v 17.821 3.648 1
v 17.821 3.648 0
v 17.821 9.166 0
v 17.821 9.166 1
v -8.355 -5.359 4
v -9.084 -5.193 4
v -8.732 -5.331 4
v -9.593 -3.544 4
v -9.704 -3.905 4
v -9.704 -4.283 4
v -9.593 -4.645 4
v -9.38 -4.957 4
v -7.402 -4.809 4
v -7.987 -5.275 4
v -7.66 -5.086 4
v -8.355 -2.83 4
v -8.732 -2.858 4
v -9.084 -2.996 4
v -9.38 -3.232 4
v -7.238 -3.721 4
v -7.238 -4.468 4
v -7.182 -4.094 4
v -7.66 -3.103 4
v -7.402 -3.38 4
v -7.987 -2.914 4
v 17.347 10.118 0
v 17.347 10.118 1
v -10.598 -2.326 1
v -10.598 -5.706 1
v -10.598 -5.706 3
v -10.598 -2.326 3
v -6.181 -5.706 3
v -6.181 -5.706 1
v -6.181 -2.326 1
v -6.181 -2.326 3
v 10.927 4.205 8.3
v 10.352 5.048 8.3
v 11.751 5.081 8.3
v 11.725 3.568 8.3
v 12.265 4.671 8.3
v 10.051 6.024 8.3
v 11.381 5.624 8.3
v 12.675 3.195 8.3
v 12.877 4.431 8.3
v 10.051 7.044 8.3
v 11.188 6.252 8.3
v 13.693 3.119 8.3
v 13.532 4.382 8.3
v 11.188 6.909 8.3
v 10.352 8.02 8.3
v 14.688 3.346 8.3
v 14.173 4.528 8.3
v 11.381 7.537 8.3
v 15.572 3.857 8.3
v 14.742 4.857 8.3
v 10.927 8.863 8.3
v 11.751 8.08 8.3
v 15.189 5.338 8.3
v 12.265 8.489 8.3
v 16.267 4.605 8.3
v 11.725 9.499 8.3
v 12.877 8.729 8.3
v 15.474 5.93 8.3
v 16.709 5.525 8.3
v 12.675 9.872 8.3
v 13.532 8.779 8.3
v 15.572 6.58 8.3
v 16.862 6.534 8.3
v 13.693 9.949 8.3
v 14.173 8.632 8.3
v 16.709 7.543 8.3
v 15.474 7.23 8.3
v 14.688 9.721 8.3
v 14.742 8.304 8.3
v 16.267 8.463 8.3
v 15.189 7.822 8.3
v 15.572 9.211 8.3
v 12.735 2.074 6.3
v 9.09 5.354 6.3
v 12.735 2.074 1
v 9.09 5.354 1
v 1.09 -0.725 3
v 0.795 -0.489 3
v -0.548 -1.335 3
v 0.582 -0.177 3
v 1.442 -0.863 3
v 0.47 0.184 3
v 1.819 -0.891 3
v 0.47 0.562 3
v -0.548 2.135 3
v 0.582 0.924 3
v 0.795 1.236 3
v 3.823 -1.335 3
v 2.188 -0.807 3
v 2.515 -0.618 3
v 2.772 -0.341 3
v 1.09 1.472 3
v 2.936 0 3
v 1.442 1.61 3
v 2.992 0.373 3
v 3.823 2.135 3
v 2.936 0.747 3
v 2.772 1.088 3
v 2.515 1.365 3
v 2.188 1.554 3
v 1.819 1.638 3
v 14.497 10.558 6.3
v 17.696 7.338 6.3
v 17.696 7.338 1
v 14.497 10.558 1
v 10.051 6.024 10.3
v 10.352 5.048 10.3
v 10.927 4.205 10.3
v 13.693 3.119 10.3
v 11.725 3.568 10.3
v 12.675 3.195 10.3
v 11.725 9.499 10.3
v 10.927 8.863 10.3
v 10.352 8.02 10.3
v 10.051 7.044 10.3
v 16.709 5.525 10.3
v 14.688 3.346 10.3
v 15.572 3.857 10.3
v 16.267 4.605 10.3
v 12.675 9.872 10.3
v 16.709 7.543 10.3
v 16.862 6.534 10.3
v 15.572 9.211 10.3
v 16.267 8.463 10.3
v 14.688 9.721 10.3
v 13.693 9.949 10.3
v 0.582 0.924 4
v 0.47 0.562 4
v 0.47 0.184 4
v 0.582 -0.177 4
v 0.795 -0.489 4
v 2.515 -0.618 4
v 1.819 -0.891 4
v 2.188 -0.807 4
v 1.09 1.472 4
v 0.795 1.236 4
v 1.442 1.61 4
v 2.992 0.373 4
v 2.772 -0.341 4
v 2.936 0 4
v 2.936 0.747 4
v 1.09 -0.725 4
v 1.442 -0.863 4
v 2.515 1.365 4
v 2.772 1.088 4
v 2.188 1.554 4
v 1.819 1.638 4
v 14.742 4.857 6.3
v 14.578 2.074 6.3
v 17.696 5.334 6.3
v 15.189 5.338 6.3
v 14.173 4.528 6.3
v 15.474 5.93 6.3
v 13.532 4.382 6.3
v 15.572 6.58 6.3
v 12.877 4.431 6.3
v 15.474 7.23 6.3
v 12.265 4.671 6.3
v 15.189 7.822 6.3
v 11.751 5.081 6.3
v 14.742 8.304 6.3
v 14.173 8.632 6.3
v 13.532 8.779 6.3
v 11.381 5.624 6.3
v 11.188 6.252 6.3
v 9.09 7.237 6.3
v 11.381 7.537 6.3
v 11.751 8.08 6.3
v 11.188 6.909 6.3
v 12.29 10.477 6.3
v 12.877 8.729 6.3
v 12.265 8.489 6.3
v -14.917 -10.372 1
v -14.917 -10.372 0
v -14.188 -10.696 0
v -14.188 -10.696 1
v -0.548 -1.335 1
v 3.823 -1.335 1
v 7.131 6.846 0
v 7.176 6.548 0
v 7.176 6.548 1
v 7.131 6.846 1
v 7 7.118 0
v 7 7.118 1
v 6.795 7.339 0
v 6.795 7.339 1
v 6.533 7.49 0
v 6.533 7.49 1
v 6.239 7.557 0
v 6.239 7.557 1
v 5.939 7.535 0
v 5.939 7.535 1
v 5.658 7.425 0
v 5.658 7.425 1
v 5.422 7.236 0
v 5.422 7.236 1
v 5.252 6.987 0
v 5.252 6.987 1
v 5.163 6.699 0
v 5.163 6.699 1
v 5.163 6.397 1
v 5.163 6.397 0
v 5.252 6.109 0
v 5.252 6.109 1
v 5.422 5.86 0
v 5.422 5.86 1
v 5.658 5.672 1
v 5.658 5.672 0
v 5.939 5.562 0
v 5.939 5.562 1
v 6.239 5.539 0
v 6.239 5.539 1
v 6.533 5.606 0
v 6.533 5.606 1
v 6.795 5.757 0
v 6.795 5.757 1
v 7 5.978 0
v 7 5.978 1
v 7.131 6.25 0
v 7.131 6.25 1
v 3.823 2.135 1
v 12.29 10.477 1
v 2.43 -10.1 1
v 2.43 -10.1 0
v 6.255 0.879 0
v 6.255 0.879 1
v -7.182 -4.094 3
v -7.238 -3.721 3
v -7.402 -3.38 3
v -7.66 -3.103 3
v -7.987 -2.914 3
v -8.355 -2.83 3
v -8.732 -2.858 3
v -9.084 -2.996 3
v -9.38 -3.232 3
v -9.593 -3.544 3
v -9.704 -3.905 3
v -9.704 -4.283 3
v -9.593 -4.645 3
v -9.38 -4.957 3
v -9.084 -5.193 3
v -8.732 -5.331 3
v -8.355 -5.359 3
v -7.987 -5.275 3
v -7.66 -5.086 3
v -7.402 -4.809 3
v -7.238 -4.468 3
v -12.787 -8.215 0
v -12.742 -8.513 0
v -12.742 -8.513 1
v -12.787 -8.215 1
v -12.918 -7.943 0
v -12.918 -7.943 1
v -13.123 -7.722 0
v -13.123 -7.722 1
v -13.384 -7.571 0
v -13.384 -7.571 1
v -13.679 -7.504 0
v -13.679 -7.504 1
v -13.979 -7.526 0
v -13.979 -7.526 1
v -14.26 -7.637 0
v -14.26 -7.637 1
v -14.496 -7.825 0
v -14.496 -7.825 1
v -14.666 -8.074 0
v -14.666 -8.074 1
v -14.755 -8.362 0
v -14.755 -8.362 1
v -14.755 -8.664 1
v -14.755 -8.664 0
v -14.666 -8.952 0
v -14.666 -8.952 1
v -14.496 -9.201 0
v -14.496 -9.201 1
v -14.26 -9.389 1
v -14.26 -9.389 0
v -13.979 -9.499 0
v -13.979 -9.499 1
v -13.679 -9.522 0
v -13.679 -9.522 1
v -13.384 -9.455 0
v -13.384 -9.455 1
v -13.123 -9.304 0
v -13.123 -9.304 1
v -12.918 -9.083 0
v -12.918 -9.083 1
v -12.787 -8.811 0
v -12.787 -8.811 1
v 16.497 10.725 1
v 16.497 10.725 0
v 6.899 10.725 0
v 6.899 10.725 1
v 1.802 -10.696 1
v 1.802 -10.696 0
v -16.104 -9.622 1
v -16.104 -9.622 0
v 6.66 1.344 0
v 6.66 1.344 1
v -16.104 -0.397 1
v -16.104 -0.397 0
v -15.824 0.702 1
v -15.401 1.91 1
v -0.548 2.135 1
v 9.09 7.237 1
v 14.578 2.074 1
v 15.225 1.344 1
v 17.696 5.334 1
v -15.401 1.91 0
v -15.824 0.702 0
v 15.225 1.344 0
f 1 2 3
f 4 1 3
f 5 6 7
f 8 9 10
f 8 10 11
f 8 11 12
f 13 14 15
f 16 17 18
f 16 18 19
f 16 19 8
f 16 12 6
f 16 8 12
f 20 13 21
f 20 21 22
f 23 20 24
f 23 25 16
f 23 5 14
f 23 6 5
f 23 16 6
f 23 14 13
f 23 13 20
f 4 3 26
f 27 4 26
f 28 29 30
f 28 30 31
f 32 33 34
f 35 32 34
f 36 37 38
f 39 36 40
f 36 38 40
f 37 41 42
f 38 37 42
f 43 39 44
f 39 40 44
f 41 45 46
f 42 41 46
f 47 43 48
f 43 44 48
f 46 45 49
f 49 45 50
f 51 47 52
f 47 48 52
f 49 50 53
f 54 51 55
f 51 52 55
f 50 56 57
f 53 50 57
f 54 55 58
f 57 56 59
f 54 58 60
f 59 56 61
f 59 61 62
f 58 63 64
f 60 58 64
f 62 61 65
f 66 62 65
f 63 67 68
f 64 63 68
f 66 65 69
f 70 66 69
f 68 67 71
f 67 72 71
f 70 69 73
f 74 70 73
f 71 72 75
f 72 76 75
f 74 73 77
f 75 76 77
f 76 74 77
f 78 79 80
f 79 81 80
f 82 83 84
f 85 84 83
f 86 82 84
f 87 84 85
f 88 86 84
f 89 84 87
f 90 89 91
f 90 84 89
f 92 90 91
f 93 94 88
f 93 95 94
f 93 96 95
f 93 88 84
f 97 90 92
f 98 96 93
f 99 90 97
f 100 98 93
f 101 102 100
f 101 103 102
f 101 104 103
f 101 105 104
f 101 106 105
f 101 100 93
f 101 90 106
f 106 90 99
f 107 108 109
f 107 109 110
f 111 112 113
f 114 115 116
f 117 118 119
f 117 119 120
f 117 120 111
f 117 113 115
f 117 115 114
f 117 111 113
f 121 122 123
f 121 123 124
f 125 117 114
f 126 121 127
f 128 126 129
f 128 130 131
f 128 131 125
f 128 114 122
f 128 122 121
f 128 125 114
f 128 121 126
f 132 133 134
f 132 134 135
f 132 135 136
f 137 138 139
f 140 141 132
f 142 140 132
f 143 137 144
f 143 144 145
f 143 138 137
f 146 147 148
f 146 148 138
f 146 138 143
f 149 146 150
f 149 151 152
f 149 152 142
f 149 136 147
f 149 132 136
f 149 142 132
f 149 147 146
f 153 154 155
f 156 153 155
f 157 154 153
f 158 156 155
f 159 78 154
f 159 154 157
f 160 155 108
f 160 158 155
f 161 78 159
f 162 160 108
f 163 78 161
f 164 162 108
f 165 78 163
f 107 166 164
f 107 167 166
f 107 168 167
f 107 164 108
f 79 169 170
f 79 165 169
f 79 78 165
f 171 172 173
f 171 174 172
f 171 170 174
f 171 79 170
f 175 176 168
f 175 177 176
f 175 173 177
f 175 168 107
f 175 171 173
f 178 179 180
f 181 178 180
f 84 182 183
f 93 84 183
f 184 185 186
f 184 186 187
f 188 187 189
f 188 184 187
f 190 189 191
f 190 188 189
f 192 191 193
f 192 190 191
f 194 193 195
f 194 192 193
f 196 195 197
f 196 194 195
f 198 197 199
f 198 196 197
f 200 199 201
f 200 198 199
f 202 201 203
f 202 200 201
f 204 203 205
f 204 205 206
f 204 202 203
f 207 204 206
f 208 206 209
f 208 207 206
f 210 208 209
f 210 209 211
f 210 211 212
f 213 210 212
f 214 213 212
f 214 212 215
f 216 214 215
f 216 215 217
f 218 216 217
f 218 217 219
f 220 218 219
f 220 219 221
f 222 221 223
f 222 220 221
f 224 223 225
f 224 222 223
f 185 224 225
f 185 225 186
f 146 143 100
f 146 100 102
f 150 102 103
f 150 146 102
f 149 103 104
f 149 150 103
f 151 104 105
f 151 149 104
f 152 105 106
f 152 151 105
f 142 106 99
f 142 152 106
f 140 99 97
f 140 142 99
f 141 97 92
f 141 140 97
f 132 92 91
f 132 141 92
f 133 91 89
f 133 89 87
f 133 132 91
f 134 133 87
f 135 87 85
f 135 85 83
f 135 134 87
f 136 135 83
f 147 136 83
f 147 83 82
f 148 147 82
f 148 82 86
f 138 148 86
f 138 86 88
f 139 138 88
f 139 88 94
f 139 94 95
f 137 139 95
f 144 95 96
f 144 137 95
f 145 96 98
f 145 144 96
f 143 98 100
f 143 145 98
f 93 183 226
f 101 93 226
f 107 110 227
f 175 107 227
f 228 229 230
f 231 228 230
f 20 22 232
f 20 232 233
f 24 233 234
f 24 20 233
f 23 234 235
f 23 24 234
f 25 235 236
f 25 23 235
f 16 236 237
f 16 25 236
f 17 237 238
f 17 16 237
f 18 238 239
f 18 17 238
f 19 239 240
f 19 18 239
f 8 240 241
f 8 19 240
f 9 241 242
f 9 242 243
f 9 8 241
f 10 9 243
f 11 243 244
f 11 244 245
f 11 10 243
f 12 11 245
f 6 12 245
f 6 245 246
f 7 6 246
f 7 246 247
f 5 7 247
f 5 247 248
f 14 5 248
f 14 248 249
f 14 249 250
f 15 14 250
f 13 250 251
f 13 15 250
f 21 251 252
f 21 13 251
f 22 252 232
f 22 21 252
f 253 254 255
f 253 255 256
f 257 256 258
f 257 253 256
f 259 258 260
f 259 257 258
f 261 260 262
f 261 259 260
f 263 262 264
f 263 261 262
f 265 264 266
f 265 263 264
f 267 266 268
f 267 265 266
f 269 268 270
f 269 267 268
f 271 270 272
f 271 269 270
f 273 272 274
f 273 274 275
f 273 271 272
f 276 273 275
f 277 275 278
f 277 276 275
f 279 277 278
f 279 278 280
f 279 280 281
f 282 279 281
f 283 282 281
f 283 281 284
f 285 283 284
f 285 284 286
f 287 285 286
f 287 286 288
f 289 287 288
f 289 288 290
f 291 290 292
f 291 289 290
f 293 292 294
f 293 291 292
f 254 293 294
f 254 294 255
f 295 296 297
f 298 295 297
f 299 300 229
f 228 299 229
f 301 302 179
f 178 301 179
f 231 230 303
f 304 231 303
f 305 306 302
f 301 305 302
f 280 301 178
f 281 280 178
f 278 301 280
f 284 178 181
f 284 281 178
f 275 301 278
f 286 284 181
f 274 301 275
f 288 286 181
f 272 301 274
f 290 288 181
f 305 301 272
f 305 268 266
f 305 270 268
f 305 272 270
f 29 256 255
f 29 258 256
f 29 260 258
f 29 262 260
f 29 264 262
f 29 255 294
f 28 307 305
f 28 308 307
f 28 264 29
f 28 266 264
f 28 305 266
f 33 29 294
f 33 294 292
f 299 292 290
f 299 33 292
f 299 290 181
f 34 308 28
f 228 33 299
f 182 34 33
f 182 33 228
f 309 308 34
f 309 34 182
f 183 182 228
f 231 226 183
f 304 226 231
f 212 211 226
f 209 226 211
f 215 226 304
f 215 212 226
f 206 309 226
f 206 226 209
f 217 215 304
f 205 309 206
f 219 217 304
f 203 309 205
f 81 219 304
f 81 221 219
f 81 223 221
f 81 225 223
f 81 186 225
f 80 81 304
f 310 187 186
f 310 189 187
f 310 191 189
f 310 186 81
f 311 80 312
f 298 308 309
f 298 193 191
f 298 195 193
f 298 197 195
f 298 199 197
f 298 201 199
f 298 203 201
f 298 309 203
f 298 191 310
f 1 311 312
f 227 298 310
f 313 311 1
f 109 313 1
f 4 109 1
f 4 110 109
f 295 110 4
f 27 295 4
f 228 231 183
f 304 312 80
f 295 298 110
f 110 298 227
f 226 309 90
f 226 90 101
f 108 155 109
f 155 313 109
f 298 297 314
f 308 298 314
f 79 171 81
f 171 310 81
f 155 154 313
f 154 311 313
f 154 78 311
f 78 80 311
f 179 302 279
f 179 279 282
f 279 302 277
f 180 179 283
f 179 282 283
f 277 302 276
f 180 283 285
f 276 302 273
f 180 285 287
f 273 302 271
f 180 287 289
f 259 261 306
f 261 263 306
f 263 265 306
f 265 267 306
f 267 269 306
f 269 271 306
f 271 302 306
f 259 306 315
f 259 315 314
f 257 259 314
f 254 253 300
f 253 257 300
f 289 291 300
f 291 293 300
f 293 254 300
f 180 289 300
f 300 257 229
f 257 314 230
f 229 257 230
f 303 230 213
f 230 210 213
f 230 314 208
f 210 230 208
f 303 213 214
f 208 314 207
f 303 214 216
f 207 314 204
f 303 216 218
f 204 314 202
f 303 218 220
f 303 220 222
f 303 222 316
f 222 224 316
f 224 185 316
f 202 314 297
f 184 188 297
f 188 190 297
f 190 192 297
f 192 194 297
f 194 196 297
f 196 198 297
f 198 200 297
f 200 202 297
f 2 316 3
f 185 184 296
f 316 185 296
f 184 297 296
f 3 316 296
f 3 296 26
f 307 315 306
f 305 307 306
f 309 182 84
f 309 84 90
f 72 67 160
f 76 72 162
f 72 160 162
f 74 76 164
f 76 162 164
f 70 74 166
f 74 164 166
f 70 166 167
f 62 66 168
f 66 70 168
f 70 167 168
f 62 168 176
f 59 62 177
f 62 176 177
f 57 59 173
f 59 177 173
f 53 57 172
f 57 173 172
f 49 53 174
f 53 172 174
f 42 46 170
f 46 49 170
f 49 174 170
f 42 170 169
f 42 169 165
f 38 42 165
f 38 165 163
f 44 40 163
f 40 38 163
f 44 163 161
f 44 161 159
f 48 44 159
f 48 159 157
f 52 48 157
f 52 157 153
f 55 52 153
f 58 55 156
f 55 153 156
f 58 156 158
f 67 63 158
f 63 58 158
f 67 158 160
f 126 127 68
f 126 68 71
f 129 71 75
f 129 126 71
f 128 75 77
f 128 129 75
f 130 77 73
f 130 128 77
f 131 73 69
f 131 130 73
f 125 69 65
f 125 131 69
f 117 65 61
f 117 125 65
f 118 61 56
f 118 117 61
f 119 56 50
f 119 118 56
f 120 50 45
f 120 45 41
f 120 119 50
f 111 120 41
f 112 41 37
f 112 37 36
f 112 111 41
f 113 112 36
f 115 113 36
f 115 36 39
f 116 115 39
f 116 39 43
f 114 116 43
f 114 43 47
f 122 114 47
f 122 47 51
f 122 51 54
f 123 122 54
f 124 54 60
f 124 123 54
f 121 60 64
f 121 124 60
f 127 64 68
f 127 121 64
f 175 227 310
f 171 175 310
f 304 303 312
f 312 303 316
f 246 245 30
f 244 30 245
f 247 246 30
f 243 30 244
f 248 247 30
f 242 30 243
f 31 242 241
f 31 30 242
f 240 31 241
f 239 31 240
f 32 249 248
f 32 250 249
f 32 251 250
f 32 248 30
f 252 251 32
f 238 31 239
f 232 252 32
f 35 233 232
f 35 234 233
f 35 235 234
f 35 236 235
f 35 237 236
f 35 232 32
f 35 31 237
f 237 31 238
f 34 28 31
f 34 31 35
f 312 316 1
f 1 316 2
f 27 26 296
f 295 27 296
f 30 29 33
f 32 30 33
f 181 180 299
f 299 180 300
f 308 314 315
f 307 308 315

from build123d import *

# Parameters (mm, degrees)
SKETCH031_R     = 1.011832
PAD027_DEPTH    = 1
SKETCH032_W     = 4.41637
SKETCH032_H     = 3.379875
SKETCH032_W_2   = 4.371405
SKETCH032_H_2   = 3.470269
PAD028_DEPTH    = 3
PAD029_DEPTH    = 2.3
SKETCH034_R     = 2.204503
PAD030_DEPTH    = 4
SKETCH035_R     = 3.424311
PAD031_DEPTH    = 2
SKETCH036_W     = 18.521845
SKETCH036_H     = 12.987429
SKETCH036_R     = 1.2680878078
POCKET007_DEPTH = 1


with BuildPart() as part:
    # Sketch031 → Pad027 (new body)
    with BuildSketch(Plane.XY):
        Polygon((-15.824113, 0.702012), (-16.104103, -0.397312), (-16.104103, -9.622469), (-14.917328, -10.371682), (-14.188362, -10.695666), (1.802157, -10.695666), (2.429877, -10.099644), (6.254575, 0.878554), (6.659555, 1.344282), (15.224892, 1.344282), (17.820574, 3.648021), (17.820574, 9.166112), (17.347485, 10.117816), (16.497025, 10.725287), (6.898985, 10.725287), (-15.4012, 1.910333), align=None)
        with Locations((-13.754142, -8.512947)):
            Circle(SKETCH031_R, mode=Mode.SUBTRACT)
        with Locations((6.163737, 6.548235)):
            Circle(SKETCH031_R, mode=Mode.SUBTRACT)
    extrude(amount=PAD027_DEPTH)

    # Sketch032 (on Face20 of Pad027) → Pad028 (join)
    with BuildSketch(Plane.XY.offset(1)):
        with Locations((-8.389468, -4.0162585)):
            Rectangle(SKETCH032_W, SKETCH032_H)
        with Locations((1.6375455, 0.4002435)):
            Rectangle(SKETCH032_W_2, SKETCH032_H_2)
        Polygon((9.090246, 7.237029), (12.289592, 10.476871), (14.496734, 10.557867), (17.696077, 7.338274), (17.696077, 5.333621), (14.57773, 2.073529), (12.735069, 2.073529), (9.090246, 5.35387), align=None)
    extrude(amount=PAD028_DEPTH)

    # Pad028 Face39 → Pad029 (add)
    with BuildSketch(Plane(origin=(13.4460203648, 6.3372919202, 4), x_dir=(0, 1, 0), z_dir=(0, 0, 1))):
        Polygon((4.1395790798, 1.1564283648), (0.8997370798, 4.3557743648), (-0.9834219202, 4.3557743648), (-4.2637629202, 0.7109513648), (-4.2637629202, -1.1317096352), (-1.0036709202, -4.2500566352), (1.0009820798, -4.2500566352), (4.2205750798, -1.0507136352), align=None)
    extrude(amount=PAD029_DEPTH)

    # Sketch034 (on Face47 of Pad029) → Pad030 (join)
    with BuildSketch(Plane.XY.offset(6.3)):
        with Locations((13.367406, 6.580182)):
            Circle(SKETCH034_R)
    extrude(amount=PAD030_DEPTH)

    # Sketch035 (on Face49 of Pad030) → Pad031 (join)
    with BuildSketch(Plane.XY.offset(10.3)):
        with Locations((13.437232, 6.533877)):
            Circle(SKETCH035_R)
    extrude(amount=-PAD031_DEPTH)

    # Sketch036 (on Face38 of Pad031) → Pocket007 (cut)
    with BuildSketch(Plane.XY.offset(4)):
        with Locations((-4.0809855, -1.9936815)):
            Rectangle(SKETCH036_W, SKETCH036_H)
        with Locations((1.724279, 0.373466)):
            Circle(SKETCH036_R, mode=Mode.SUBTRACT)
        with Locations((-8.450182, -4.094334)):
            Circle(SKETCH036_R, mode=Mode.SUBTRACT)
    extrude(amount=-POCKET007_DEPTH, mode=Mode.SUBTRACT)


solid = part.part
